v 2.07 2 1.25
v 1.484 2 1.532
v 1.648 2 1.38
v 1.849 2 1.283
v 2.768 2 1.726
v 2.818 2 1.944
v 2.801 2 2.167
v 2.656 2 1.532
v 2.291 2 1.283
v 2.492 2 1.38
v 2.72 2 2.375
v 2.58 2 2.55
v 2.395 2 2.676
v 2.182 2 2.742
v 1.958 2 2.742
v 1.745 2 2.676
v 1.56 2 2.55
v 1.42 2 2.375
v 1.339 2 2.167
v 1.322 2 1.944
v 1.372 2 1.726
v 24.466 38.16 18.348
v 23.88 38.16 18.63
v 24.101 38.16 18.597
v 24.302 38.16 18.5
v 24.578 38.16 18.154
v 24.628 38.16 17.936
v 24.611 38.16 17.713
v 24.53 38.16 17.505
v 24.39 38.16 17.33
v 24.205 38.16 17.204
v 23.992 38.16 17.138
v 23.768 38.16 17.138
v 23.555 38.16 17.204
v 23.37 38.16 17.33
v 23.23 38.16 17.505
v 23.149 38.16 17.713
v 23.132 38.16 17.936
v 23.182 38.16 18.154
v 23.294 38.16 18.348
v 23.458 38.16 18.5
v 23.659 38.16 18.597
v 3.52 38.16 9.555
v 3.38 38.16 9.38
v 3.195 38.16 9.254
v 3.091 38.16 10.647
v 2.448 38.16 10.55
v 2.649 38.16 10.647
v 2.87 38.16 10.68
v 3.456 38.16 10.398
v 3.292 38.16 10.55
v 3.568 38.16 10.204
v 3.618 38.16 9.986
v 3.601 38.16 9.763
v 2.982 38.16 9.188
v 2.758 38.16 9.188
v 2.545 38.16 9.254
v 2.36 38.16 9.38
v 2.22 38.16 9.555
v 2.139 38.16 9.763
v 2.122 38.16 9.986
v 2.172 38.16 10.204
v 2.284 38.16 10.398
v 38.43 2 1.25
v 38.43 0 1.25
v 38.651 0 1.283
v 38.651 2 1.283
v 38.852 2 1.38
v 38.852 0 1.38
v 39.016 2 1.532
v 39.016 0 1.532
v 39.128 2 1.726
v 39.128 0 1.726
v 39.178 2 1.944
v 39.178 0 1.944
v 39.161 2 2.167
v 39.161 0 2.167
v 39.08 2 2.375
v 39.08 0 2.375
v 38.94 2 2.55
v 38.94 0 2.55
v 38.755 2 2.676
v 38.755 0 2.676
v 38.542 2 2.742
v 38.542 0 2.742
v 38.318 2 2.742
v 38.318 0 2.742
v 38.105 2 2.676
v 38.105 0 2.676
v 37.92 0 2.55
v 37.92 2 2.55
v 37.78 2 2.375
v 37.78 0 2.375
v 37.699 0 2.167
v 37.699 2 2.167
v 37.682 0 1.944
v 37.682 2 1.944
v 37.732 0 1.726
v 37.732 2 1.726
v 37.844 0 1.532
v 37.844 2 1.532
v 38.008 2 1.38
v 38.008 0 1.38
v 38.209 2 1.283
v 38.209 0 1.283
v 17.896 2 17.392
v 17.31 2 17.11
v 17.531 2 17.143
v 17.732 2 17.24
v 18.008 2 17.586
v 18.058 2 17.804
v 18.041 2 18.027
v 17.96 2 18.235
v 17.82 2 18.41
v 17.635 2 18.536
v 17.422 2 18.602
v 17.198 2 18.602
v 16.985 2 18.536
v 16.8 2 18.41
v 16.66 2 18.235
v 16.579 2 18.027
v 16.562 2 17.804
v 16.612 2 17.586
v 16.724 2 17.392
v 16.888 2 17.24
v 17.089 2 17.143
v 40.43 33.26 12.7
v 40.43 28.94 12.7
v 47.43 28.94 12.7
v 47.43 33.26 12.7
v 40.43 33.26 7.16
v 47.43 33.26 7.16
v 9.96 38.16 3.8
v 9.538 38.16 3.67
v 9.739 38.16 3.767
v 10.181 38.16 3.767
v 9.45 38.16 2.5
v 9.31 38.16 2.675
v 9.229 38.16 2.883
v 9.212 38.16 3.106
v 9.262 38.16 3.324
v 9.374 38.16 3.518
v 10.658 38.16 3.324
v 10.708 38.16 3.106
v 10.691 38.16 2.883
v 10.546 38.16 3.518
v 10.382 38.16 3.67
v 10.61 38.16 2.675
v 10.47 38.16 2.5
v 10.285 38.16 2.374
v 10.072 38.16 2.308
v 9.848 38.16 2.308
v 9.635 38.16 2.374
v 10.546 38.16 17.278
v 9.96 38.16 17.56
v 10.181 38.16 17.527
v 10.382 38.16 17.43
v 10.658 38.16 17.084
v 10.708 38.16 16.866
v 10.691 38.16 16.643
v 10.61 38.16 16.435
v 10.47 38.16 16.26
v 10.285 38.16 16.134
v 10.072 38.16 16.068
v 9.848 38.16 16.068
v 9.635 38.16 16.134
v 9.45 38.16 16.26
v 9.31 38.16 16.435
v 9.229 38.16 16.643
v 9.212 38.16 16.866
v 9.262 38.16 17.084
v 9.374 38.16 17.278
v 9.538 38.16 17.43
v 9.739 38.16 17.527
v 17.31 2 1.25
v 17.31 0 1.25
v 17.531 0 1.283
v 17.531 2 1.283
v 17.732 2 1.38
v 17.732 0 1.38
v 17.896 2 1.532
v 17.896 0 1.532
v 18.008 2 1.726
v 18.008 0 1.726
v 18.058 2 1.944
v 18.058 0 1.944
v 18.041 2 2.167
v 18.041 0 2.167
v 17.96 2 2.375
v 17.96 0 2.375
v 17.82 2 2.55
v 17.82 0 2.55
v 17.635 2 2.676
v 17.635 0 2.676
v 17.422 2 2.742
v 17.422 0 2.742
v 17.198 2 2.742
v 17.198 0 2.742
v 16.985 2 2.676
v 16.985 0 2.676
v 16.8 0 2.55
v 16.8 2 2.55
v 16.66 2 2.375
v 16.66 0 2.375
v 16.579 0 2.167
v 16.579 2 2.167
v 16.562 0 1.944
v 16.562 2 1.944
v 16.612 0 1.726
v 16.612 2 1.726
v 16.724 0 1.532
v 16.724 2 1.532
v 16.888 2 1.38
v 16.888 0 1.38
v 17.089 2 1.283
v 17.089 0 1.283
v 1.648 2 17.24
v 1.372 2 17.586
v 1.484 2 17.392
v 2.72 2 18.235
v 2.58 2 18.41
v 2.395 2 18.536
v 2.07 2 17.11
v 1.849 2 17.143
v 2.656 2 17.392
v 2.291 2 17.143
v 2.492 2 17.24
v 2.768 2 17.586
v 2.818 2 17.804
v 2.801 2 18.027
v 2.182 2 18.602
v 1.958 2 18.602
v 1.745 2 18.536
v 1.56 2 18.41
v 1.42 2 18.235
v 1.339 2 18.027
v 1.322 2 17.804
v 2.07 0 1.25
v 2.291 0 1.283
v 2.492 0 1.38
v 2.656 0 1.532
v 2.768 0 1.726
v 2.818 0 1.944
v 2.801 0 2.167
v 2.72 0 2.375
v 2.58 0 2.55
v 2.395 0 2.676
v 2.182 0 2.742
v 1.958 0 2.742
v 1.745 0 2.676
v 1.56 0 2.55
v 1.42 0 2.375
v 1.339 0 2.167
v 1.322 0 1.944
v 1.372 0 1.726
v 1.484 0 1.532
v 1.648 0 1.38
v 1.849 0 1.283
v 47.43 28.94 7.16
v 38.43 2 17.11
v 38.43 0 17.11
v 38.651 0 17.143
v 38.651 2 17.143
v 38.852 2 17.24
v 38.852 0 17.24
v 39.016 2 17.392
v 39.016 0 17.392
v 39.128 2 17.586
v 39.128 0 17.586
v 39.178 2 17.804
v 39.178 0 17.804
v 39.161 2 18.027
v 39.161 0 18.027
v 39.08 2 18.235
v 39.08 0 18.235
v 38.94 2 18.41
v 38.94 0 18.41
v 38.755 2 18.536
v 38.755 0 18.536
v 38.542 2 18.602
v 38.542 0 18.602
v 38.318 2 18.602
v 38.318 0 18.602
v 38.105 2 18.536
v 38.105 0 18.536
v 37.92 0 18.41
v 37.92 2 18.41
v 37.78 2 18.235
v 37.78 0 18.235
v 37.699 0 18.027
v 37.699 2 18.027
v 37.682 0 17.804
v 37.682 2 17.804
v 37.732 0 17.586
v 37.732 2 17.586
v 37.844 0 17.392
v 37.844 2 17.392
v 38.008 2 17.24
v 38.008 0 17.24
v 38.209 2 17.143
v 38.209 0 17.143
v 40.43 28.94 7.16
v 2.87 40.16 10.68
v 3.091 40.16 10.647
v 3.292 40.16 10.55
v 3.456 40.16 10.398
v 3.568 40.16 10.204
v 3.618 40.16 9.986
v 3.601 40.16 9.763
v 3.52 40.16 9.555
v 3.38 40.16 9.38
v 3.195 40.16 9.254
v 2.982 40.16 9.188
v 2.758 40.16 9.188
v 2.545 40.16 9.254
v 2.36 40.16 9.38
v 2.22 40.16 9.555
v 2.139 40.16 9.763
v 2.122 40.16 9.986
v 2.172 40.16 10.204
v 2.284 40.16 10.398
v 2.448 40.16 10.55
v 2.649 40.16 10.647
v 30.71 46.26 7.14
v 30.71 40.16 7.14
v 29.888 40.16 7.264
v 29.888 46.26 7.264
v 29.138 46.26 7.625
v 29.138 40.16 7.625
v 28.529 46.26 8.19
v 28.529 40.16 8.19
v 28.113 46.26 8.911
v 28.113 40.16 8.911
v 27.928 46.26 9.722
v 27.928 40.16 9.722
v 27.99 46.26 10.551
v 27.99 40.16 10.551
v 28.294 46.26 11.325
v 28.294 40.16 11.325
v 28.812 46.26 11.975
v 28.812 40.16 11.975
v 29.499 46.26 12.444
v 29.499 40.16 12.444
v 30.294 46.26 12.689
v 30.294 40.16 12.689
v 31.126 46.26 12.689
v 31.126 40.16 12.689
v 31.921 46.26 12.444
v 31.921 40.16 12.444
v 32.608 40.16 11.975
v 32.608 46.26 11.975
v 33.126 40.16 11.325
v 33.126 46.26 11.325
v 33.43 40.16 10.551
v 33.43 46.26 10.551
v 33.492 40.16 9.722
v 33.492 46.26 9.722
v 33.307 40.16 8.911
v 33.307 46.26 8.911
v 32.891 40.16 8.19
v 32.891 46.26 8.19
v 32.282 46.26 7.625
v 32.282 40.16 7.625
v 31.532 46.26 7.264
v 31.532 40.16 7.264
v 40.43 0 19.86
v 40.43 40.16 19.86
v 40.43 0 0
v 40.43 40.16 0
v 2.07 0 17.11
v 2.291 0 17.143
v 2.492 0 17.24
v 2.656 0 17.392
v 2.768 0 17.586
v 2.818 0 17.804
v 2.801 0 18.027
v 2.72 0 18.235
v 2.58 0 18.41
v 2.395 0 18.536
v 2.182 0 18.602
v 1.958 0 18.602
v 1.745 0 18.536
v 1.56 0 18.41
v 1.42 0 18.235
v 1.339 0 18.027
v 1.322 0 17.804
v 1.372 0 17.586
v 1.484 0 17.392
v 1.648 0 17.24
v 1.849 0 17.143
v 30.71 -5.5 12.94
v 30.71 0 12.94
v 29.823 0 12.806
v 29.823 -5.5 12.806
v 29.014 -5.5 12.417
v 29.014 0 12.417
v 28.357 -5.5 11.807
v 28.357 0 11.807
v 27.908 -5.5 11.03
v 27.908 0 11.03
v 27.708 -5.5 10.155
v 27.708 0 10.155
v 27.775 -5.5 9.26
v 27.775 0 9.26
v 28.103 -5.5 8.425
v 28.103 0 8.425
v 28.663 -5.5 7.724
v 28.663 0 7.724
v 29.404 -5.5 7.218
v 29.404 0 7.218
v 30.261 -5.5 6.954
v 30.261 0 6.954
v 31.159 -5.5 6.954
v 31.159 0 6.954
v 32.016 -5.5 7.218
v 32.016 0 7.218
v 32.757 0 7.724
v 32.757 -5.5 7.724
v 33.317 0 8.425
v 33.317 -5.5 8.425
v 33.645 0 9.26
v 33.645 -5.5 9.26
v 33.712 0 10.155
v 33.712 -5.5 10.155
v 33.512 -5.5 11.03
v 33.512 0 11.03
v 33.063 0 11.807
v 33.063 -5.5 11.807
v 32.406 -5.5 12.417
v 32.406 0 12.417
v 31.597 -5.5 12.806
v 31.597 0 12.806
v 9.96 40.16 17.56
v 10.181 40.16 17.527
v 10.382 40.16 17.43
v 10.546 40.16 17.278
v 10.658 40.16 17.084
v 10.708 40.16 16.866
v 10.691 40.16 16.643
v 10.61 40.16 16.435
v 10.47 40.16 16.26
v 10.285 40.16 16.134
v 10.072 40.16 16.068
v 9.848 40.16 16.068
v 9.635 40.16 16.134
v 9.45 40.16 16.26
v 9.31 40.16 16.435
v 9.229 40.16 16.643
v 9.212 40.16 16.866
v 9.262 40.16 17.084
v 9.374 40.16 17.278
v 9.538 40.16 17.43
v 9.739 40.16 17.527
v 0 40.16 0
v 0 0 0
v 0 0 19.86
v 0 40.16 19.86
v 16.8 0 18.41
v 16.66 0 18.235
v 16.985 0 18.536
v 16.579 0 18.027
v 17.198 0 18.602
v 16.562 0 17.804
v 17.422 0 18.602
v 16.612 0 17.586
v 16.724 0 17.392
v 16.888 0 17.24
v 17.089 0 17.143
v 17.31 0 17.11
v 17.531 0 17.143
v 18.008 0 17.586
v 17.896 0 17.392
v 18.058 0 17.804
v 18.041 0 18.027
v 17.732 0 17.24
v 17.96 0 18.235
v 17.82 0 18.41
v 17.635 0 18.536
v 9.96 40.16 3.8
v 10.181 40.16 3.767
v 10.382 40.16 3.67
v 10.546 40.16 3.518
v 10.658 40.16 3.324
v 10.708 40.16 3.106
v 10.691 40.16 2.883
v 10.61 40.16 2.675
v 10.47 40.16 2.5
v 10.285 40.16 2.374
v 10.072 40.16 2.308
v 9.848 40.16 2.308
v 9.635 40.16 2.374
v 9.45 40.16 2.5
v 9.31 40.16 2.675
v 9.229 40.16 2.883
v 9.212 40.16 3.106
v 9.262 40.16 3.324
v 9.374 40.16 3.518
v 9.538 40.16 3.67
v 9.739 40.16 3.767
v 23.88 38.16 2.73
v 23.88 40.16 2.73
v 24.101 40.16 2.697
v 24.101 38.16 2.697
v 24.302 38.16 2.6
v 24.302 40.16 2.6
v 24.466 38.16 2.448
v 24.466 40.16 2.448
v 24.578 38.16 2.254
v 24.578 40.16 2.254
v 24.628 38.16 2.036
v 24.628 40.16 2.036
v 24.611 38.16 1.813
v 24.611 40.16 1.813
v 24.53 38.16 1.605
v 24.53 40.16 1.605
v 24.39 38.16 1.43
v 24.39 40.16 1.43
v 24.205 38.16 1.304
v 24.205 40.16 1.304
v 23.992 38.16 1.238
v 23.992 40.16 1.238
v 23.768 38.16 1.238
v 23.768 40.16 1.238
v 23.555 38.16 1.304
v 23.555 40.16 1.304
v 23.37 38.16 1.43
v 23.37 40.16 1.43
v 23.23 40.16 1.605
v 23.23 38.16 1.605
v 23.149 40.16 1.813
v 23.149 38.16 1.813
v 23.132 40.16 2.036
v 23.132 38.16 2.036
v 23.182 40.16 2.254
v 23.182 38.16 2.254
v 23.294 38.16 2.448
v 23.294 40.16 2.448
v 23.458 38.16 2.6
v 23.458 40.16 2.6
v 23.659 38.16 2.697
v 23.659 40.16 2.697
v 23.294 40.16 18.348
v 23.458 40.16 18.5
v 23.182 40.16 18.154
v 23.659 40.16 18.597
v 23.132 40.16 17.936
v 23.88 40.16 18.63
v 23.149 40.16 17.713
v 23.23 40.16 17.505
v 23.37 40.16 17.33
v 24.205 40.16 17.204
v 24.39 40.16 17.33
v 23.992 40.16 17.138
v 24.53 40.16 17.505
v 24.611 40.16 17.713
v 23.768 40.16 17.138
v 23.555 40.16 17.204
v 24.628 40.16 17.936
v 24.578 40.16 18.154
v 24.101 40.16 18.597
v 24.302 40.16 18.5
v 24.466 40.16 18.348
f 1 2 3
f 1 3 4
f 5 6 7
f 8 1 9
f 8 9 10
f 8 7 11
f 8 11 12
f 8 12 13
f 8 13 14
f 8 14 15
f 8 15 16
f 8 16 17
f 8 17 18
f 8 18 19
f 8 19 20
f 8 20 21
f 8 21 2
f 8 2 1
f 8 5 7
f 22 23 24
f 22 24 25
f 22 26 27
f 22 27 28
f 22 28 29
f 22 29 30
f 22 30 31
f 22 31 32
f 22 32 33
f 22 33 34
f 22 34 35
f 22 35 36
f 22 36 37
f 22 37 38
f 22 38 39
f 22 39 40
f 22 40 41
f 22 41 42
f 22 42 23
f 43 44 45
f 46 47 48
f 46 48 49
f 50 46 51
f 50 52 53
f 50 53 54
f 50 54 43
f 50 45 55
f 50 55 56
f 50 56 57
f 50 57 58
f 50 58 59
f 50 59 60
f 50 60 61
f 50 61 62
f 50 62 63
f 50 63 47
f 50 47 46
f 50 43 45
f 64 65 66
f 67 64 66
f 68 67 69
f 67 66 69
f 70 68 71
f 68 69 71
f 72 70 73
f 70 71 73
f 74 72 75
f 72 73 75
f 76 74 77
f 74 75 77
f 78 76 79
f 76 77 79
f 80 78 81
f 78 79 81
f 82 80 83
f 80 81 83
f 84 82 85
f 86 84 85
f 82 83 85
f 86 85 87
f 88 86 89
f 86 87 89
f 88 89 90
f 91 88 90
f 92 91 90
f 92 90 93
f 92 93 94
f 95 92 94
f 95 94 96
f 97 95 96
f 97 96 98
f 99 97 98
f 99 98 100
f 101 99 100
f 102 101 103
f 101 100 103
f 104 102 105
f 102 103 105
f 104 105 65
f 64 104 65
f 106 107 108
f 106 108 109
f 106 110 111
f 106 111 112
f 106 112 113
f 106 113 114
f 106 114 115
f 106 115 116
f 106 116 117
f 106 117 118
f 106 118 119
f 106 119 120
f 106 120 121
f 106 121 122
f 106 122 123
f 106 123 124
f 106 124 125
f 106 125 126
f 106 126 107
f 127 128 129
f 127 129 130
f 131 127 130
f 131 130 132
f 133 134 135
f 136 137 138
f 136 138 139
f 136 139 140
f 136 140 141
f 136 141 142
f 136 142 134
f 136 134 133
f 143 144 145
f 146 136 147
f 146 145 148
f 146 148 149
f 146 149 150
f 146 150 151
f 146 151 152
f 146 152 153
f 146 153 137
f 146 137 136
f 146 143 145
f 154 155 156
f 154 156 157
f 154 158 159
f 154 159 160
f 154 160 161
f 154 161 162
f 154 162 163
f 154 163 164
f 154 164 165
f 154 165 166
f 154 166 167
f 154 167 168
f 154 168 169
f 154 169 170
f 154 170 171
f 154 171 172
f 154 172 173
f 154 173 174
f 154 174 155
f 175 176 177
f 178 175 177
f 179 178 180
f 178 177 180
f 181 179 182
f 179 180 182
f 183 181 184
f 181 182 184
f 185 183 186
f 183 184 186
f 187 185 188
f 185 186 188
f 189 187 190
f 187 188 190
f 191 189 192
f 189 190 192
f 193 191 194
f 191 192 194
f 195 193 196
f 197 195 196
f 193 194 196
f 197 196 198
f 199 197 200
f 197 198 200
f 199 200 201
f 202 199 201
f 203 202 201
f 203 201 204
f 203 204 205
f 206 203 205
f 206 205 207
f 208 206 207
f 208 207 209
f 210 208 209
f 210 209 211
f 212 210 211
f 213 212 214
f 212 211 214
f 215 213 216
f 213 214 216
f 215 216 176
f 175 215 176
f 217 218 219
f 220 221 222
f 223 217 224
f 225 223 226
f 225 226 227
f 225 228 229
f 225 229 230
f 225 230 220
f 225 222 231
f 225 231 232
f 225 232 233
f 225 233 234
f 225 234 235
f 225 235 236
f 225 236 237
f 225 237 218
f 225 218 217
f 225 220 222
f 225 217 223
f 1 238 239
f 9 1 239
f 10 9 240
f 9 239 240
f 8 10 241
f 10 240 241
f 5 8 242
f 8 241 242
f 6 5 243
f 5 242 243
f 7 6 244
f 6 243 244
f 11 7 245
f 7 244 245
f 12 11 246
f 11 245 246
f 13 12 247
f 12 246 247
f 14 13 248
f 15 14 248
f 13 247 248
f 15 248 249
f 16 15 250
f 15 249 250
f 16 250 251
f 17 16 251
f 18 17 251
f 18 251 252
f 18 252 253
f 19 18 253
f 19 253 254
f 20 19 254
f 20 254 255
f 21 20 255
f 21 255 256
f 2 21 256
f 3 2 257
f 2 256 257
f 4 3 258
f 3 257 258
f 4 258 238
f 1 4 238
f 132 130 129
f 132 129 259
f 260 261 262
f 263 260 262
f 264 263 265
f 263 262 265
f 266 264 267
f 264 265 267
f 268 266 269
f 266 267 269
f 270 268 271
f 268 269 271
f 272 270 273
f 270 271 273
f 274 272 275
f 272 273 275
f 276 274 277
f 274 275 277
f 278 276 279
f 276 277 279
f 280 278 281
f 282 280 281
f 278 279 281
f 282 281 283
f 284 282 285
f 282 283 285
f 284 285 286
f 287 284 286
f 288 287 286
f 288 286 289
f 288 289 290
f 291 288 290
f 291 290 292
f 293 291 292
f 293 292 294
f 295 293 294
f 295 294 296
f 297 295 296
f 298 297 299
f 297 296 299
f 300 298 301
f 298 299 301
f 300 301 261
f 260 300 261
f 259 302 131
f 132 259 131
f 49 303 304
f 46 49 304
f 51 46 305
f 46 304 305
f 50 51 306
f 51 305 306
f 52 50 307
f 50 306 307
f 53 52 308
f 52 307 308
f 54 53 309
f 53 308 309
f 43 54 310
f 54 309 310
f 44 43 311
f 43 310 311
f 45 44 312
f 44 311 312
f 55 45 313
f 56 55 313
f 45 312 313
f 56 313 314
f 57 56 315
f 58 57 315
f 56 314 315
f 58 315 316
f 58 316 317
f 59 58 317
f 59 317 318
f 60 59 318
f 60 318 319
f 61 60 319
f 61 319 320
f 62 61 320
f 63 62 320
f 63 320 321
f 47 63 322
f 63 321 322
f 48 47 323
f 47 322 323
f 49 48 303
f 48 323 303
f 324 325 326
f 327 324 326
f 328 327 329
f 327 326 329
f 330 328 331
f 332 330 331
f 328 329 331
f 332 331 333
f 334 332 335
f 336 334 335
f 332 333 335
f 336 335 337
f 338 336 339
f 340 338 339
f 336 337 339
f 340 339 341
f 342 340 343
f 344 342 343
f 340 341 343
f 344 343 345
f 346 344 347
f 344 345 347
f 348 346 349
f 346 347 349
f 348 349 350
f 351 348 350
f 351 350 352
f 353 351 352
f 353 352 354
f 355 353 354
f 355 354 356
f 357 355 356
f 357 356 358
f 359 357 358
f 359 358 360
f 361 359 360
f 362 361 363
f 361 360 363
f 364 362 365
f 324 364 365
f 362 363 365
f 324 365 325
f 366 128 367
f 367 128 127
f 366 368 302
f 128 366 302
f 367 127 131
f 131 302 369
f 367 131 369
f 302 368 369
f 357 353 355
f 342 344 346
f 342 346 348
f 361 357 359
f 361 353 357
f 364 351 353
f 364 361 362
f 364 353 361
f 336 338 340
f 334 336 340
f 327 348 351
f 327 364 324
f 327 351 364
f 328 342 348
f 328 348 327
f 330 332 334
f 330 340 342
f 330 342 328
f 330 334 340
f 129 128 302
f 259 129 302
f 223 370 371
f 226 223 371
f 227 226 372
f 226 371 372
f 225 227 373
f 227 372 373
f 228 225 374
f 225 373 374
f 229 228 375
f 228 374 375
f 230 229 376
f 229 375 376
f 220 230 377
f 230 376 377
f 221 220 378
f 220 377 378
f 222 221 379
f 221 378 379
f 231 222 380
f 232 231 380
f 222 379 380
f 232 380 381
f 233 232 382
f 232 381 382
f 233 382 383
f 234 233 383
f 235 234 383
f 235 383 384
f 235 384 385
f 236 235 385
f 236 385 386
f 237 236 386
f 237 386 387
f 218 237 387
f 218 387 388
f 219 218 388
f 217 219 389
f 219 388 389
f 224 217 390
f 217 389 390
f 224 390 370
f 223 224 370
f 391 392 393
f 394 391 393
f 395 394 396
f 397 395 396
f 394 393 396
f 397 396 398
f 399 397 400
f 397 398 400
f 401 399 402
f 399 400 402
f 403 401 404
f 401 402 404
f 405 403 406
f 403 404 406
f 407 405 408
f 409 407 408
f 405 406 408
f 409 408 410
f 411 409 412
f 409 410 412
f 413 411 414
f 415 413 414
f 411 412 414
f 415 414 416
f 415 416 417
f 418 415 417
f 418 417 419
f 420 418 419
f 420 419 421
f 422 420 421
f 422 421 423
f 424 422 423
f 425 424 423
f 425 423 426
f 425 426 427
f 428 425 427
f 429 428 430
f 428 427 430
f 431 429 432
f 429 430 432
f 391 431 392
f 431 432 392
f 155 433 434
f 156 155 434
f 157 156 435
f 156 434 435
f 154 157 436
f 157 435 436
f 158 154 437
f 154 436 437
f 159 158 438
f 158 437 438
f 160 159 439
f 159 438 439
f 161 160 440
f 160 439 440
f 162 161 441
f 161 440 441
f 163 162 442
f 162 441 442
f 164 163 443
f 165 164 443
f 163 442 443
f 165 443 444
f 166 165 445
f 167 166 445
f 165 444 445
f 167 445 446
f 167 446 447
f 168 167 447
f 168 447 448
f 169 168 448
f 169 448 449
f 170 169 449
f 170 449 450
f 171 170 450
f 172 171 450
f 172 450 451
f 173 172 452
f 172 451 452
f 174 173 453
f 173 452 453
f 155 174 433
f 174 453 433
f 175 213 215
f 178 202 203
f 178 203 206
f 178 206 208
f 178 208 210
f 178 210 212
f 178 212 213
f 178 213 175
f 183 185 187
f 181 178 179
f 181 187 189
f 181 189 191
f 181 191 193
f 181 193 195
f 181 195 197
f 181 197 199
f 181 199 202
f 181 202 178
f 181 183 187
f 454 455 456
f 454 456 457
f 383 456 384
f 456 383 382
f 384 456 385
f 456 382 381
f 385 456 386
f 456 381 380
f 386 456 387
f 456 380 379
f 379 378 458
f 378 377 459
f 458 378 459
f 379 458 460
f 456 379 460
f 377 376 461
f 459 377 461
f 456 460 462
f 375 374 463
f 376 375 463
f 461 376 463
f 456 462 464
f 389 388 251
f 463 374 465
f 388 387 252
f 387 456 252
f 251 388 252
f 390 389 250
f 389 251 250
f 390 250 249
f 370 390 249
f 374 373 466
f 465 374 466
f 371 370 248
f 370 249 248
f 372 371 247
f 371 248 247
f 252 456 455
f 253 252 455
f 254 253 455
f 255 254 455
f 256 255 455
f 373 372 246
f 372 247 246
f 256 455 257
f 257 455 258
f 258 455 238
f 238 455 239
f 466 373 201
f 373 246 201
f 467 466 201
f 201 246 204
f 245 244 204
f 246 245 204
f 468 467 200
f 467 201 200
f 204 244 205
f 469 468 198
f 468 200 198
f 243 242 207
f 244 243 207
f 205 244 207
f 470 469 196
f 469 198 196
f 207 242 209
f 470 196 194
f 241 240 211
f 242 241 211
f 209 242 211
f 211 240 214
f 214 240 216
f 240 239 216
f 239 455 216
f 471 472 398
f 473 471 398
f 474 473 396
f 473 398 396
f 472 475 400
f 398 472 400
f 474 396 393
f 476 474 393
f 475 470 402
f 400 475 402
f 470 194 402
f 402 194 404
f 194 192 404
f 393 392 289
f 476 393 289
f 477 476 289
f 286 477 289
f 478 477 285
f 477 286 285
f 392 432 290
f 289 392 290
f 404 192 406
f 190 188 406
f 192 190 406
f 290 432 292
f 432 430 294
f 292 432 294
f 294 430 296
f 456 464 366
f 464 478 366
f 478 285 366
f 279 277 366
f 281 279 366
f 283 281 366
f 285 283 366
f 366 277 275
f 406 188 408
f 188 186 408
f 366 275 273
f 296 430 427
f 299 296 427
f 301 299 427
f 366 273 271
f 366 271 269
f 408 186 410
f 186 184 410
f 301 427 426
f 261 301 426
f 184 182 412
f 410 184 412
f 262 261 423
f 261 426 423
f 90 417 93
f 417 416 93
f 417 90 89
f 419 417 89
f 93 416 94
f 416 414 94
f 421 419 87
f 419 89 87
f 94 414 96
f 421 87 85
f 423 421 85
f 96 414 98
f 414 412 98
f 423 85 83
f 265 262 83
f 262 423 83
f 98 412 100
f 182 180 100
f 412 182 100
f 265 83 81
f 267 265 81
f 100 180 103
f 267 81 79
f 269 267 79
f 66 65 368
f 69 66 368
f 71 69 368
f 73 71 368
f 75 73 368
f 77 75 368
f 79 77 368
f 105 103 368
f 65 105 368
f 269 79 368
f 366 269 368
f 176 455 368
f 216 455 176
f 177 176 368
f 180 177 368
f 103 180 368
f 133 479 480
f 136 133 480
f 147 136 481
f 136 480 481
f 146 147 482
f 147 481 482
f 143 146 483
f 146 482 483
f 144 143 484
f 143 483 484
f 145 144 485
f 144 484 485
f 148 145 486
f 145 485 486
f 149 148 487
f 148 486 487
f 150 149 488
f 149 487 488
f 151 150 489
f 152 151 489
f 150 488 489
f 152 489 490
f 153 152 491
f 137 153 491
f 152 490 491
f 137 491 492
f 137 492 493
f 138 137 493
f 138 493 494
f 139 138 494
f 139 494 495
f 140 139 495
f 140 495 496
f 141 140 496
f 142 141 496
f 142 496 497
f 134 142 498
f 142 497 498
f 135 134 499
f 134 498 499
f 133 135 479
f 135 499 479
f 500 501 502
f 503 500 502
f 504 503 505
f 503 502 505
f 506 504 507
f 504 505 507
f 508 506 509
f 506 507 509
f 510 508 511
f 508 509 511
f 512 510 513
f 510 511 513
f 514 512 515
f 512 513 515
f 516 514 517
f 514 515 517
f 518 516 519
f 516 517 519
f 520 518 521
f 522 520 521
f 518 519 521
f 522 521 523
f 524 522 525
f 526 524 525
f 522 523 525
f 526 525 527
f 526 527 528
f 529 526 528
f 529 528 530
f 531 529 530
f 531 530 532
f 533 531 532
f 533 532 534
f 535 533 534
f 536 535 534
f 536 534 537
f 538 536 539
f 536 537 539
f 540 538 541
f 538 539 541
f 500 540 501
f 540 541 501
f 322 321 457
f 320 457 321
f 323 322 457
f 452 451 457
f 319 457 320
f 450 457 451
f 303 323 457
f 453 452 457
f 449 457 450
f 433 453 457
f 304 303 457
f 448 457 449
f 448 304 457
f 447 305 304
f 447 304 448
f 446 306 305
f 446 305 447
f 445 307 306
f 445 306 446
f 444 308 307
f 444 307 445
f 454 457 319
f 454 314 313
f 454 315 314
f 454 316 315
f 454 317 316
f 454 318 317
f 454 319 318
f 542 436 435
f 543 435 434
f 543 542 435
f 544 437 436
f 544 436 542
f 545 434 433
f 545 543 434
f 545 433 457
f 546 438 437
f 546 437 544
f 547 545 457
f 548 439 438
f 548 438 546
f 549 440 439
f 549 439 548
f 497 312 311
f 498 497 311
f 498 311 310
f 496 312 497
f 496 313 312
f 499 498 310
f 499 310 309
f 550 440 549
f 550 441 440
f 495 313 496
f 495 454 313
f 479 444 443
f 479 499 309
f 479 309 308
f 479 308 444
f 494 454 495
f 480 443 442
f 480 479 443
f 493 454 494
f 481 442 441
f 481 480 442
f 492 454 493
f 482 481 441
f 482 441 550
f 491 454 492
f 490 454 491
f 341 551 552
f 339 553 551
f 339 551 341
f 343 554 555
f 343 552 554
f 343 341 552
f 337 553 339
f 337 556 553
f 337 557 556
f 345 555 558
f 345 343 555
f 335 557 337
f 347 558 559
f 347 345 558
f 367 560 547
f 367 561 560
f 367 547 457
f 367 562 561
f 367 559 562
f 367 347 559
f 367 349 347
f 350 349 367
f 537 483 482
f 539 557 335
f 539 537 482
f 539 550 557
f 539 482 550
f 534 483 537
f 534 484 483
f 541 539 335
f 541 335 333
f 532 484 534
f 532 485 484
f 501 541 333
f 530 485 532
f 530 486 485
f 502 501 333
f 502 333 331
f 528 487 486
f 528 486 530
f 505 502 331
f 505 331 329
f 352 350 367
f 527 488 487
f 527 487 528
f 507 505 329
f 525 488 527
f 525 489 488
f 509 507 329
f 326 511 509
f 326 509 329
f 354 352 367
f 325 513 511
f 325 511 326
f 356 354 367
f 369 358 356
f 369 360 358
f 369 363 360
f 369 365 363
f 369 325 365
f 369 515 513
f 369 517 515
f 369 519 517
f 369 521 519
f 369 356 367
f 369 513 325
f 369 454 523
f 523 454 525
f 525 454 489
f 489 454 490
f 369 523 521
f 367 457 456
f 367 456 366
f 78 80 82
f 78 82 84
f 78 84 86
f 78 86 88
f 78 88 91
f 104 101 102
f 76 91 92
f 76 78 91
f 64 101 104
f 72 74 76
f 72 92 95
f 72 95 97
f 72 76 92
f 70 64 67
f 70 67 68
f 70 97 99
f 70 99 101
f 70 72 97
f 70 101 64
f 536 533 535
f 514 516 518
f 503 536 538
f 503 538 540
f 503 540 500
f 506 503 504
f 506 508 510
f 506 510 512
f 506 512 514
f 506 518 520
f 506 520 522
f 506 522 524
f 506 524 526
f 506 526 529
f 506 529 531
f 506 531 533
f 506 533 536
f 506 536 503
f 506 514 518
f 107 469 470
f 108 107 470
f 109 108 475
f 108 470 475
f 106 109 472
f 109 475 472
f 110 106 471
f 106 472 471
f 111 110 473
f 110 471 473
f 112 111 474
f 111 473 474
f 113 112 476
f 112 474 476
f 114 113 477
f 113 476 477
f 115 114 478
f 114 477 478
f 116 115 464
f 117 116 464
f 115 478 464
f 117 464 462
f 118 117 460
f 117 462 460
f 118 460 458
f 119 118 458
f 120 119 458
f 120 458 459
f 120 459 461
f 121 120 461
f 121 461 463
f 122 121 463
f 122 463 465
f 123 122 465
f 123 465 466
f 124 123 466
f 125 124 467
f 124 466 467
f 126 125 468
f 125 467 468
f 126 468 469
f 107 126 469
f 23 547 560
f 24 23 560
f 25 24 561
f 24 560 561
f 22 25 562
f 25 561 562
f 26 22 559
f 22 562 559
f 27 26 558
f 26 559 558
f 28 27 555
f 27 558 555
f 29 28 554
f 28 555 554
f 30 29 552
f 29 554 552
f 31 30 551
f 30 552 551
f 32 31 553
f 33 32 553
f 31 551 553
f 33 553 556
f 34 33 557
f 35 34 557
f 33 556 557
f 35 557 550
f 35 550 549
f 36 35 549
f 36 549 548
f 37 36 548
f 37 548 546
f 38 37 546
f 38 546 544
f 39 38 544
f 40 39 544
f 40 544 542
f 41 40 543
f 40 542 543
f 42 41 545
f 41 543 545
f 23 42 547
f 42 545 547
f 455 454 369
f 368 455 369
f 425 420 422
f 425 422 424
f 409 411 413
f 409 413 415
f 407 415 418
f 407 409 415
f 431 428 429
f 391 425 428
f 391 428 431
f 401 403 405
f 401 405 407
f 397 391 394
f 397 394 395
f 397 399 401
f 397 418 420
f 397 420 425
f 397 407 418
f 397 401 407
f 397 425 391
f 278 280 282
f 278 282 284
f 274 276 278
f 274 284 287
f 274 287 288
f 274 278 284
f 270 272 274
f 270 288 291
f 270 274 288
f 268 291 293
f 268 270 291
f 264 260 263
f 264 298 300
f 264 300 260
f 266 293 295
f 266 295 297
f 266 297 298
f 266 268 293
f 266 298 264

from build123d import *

# Parameters (mm, degrees)
SKETCH1_W              = 40.43
SKETCH1_H              = 40.16
SERVOBODY_DEPTH        = 19.86
SKETCH2_R              = 2.79
GEARHINGE_DEPTH        = 6.1
SKETCH3_R              = 3.01
SMOOTHHINGE_DEPTH      = 5.5
SKETCH4_R              = 0.75
GEARSCREWHOLES_DEPTH   = 2
SKETCH5_R              = 0.75
SMOOTHSCREWHOLES_DEPTH = 2
SKETCH6_W              = 5.54
SKETCH6_H              = 4.32
CABLE_DEPTH            = 7


with BuildPart() as part:
    # Sketch1 → ServoBody (new body)
    with BuildSketch(Plane.XY):
        with Locations((20.215, 20.08)):
            Rectangle(SKETCH1_W, SKETCH1_H)
    extrude(amount=SERVOBODY_DEPTH)

    # Sketch2 → GearHinge (add)
    with BuildSketch(Plane(origin=(0, 40.16, 0), x_dir=(1, 0, 0), z_dir=(0, 1, 0))):
        with Locations(Location((30.71, -9.93, 0), (0, 0, 90))):
            Circle(SKETCH2_R)
    extrude(amount=GEARHINGE_DEPTH)

    # Sketch3 → SmoothHinge (add)
    with BuildSketch(Plane.XZ):
        with Locations(Location((30.71, 9.93, 0), (0, 0, 90))):
            Circle(SKETCH3_R)
    extrude(amount=SMOOTHHINGE_DEPTH)

    # Sketch4 → GearScrewHoles (cut)
    with BuildSketch(Plane(origin=(0, 40.16, 0), x_dir=(1, 0, 0), z_dir=(0, 1, 0))):
        with Locations(Location((23.88, -1.98, 0), (0, 0, 270))):
            Circle(SKETCH4_R)
        with Locations(Location((23.88, -17.88, 0), (0, 0, 270))):
            Circle(SKETCH4_R)
        with Locations(Location((2.87, -9.93, 0), (0, 0, 270))):
            Circle(SKETCH4_R)
        with Locations(Location((9.96, -3.05, 0), (0, 0, 270))):
            Circle(SKETCH4_R)
        with Locations(Location((9.96, -16.81, 0), (0, 0, 270))):
            Circle(SKETCH4_R)
    extrude(amount=-GEARSCREWHOLES_DEPTH, mode=Mode.SUBTRACT)

    # Sketch5 → SmoothScrewHoles (cut)
    with BuildSketch(Plane.XZ):
        with Locations(Location((17.31, 17.86, 0), (0, 0, 270))):
            Circle(SKETCH5_R)
        with Locations(Location((38.43, 17.86, 0), (0, 0, 270))):
            Circle(SKETCH5_R)
        with Locations(Location((2.07, 17.86, 0), (0, 0, 270))):
            Circle(SKETCH5_R)
        with Locations(Location((17.31, 2, 0), (0, 0, 270))):
            Circle(SKETCH5_R)
        with Locations(Location((38.43, 2, 0), (0, 0, 270))):
            Circle(SKETCH5_R)
        with Locations(Location((2.07, 2, 0), (0, 0, 270))):
            Circle(SKETCH5_R)
    extrude(amount=-SMOOTHSCREWHOLES_DEPTH, mode=Mode.SUBTRACT)

    # Sketch6 → Cable (add)
    with BuildSketch(Plane(origin=(40.43, 0, 0), x_dir=(0, 0, -1), z_dir=(1, 0, 0))):
        with Locations((-9.93, 31.1)):
            Rectangle(SKETCH6_W, SKETCH6_H)
    extrude(amount=CABLE_DEPTH)


solid = part.part
